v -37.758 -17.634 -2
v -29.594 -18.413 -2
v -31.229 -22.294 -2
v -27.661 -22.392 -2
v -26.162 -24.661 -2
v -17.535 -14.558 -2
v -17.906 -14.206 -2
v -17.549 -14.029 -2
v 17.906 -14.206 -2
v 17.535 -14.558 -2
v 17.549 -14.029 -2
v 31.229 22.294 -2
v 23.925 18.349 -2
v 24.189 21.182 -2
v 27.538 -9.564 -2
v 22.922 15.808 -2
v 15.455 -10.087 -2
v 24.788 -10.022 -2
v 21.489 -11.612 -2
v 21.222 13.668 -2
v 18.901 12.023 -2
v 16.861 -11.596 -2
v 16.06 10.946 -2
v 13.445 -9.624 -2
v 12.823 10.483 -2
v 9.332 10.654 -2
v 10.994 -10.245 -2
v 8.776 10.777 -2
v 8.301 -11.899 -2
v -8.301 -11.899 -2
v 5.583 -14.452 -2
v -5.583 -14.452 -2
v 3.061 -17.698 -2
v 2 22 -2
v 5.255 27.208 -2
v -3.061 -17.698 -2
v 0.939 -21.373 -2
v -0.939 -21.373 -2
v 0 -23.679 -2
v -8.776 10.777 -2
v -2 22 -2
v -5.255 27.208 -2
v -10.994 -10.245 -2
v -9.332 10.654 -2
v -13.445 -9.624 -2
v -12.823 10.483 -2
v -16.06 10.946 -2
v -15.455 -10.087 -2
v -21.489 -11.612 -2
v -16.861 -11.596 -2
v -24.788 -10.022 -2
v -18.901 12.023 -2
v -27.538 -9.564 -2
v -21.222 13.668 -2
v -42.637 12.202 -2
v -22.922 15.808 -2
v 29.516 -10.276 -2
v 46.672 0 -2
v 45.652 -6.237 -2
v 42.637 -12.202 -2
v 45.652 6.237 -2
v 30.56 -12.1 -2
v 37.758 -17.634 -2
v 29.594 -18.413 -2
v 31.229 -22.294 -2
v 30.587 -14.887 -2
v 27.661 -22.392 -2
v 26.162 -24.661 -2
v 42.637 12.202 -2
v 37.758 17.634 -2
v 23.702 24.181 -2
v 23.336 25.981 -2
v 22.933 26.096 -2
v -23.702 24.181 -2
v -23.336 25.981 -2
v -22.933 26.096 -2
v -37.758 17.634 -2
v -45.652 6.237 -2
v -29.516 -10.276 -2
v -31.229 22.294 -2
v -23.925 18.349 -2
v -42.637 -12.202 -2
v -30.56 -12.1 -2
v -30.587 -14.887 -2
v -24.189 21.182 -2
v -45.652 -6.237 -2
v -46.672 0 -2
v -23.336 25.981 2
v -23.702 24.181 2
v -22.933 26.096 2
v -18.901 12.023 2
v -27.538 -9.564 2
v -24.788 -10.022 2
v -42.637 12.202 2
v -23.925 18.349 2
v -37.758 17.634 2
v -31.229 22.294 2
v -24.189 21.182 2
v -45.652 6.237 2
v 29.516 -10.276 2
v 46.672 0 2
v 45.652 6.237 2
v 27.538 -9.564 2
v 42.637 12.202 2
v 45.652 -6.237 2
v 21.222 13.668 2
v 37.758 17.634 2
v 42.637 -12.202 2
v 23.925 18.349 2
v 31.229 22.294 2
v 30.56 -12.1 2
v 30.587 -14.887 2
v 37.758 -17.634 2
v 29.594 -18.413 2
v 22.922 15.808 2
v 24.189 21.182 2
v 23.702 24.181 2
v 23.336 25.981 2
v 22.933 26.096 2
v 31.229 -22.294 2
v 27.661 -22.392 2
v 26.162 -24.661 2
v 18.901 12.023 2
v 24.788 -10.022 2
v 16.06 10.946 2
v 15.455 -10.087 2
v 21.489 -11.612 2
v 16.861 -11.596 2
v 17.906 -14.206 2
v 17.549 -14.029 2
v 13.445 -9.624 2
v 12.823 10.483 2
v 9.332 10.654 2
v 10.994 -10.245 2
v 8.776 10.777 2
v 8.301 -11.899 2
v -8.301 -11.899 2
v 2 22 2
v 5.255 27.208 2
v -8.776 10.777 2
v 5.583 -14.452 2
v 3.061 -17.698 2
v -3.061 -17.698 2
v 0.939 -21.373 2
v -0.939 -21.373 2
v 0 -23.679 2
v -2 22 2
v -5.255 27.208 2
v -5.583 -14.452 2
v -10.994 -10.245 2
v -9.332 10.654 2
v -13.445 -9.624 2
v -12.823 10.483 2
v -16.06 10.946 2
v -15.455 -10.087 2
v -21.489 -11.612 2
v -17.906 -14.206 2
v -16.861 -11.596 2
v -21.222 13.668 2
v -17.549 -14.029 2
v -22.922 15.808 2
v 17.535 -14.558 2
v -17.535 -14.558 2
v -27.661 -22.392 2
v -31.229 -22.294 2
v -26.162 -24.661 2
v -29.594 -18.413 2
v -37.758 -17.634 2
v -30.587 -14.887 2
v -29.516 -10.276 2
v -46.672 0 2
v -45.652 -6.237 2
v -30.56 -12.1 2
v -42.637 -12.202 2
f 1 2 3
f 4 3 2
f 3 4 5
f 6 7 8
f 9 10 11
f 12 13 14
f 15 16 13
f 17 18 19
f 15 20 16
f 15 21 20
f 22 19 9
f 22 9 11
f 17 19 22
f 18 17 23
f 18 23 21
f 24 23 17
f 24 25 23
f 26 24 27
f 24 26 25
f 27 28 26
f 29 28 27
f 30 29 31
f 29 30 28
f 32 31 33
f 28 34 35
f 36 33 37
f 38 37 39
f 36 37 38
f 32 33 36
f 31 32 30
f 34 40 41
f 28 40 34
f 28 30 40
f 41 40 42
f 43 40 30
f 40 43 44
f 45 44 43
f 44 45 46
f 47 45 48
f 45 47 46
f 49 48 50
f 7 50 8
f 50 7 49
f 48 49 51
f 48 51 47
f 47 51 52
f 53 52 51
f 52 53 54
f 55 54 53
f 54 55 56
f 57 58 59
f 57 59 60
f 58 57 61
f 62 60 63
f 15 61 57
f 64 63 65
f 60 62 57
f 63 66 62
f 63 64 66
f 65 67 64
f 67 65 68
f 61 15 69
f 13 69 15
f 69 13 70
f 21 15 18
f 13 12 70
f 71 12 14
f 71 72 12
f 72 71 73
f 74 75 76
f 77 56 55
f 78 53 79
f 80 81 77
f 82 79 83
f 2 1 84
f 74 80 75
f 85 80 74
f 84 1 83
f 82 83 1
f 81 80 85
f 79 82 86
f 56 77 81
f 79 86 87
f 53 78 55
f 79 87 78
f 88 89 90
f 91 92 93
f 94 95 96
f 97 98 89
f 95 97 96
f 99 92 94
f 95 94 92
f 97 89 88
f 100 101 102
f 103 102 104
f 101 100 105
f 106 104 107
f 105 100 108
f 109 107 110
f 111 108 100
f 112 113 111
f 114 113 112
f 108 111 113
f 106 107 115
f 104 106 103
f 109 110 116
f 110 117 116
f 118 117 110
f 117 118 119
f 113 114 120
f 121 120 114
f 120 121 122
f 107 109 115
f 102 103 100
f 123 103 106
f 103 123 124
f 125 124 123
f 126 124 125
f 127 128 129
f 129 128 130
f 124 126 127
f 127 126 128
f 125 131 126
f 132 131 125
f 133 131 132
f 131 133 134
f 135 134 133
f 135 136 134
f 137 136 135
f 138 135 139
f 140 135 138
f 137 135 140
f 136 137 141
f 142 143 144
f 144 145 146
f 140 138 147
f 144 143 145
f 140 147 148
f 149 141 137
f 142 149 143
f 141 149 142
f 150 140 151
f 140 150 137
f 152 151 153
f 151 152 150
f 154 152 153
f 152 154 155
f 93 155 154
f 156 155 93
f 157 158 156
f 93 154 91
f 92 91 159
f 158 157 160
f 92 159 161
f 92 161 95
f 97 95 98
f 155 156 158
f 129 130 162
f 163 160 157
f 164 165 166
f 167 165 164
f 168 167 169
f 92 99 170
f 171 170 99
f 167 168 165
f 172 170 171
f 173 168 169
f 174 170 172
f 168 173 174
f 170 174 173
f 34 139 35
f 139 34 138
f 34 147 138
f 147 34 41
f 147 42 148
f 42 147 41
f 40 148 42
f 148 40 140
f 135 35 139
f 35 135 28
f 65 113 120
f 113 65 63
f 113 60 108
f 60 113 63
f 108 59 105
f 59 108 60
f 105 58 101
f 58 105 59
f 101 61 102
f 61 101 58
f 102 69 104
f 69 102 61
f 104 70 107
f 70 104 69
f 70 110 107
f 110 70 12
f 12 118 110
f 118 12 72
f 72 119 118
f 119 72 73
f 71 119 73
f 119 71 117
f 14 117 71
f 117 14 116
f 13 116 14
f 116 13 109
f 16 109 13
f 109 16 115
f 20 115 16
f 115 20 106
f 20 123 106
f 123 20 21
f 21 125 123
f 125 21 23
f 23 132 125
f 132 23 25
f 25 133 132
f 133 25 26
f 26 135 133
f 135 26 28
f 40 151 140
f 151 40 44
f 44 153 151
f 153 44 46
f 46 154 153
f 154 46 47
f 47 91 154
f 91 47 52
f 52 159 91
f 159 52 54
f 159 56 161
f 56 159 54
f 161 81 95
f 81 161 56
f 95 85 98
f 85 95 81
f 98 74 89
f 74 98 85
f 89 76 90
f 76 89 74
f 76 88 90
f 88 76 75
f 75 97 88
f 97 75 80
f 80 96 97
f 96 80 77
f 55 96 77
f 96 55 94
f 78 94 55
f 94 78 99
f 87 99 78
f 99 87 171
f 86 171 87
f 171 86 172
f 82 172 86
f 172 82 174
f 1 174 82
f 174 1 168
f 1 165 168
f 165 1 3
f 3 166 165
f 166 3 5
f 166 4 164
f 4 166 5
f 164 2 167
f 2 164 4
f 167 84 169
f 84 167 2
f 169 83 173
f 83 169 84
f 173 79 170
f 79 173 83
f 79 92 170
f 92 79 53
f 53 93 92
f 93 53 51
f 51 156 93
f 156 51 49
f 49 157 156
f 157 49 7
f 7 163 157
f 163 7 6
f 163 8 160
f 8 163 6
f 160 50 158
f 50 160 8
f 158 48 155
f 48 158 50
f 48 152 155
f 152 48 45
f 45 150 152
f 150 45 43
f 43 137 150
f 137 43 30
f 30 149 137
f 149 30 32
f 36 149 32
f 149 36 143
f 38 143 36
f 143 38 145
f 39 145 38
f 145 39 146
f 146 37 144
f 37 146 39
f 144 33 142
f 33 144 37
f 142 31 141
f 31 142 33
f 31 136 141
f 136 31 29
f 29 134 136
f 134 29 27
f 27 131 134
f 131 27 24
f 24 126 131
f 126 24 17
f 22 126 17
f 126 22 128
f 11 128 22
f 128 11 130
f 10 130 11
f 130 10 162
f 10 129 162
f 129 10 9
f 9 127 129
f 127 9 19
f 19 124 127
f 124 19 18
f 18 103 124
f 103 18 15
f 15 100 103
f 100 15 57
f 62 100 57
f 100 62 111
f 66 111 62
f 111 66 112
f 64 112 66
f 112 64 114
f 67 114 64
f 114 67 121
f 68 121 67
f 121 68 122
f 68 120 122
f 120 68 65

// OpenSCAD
batmanLogo();

module batmanLogo()
{
    color([0.15,0.15,0.15])
    linear_extrude(height = 4, center = true, convexity = 10, twist = 0)
    difference()
    {
        
        translate([0,20,0])
        polygon(points=[[-9.8, -14], [9.8,-14],[3.8, 14],[-3.8, 14] ],paths=[[0,1,2,3]], convexity=10);
    
        translate([0,30,0])
        polygon(points=[[-2, -8], [2,-8],[12, 8],[-12, 8] ],paths=[[0,1,2,3]], convexity=10);
    }
    
    color([0.15,0.15,0.15])
    linear_extrude(height = 4, center = true, convexity = 10, twist = 0)
    difference()
    {
    
        projection(cut=true) 
        rotate([0,50,0])
        cylinder(r=30, h=200, center=true);
    
        translate([-8,-23,0]) 
        rotate([0,0,-60])
        projection(cut=true)
        rotate([0,62,0])
        cylinder(r=7, h=200, center=true);
    
        translate([8,-23,0]) 
        rotate([0,0,60])
        projection(cut=true)
        rotate([0,62,0])
        cylinder(r=7, h=200, center=true);
    
        translate([-18,-24,0]) 
        rotate([0,0,-50])
        projection(cut=true)
        rotate([0,67,0])
        cylinder(r=7, h=200, center=true);
    
        translate([18,-24,0]) 
        rotate([0,0,50])
        projection(cut=true)
        rotate([0,67,0])
        cylinder(r=7, h=200, center=true);
    
        union()
        {
    
            translate([-7,25,0]) 
            rotate([0,0,30])
            projection(cut=true)
            rotate([0,45,0])
            cylinder(r=13, h=200, center=true);
    
            translate([7,25,0]) 
            rotate([0,0,-30])
            projection(cut=true)
            rotate([0,45,0])
            cylinder(r=13, h=200, center=true);
        }
    }
}
